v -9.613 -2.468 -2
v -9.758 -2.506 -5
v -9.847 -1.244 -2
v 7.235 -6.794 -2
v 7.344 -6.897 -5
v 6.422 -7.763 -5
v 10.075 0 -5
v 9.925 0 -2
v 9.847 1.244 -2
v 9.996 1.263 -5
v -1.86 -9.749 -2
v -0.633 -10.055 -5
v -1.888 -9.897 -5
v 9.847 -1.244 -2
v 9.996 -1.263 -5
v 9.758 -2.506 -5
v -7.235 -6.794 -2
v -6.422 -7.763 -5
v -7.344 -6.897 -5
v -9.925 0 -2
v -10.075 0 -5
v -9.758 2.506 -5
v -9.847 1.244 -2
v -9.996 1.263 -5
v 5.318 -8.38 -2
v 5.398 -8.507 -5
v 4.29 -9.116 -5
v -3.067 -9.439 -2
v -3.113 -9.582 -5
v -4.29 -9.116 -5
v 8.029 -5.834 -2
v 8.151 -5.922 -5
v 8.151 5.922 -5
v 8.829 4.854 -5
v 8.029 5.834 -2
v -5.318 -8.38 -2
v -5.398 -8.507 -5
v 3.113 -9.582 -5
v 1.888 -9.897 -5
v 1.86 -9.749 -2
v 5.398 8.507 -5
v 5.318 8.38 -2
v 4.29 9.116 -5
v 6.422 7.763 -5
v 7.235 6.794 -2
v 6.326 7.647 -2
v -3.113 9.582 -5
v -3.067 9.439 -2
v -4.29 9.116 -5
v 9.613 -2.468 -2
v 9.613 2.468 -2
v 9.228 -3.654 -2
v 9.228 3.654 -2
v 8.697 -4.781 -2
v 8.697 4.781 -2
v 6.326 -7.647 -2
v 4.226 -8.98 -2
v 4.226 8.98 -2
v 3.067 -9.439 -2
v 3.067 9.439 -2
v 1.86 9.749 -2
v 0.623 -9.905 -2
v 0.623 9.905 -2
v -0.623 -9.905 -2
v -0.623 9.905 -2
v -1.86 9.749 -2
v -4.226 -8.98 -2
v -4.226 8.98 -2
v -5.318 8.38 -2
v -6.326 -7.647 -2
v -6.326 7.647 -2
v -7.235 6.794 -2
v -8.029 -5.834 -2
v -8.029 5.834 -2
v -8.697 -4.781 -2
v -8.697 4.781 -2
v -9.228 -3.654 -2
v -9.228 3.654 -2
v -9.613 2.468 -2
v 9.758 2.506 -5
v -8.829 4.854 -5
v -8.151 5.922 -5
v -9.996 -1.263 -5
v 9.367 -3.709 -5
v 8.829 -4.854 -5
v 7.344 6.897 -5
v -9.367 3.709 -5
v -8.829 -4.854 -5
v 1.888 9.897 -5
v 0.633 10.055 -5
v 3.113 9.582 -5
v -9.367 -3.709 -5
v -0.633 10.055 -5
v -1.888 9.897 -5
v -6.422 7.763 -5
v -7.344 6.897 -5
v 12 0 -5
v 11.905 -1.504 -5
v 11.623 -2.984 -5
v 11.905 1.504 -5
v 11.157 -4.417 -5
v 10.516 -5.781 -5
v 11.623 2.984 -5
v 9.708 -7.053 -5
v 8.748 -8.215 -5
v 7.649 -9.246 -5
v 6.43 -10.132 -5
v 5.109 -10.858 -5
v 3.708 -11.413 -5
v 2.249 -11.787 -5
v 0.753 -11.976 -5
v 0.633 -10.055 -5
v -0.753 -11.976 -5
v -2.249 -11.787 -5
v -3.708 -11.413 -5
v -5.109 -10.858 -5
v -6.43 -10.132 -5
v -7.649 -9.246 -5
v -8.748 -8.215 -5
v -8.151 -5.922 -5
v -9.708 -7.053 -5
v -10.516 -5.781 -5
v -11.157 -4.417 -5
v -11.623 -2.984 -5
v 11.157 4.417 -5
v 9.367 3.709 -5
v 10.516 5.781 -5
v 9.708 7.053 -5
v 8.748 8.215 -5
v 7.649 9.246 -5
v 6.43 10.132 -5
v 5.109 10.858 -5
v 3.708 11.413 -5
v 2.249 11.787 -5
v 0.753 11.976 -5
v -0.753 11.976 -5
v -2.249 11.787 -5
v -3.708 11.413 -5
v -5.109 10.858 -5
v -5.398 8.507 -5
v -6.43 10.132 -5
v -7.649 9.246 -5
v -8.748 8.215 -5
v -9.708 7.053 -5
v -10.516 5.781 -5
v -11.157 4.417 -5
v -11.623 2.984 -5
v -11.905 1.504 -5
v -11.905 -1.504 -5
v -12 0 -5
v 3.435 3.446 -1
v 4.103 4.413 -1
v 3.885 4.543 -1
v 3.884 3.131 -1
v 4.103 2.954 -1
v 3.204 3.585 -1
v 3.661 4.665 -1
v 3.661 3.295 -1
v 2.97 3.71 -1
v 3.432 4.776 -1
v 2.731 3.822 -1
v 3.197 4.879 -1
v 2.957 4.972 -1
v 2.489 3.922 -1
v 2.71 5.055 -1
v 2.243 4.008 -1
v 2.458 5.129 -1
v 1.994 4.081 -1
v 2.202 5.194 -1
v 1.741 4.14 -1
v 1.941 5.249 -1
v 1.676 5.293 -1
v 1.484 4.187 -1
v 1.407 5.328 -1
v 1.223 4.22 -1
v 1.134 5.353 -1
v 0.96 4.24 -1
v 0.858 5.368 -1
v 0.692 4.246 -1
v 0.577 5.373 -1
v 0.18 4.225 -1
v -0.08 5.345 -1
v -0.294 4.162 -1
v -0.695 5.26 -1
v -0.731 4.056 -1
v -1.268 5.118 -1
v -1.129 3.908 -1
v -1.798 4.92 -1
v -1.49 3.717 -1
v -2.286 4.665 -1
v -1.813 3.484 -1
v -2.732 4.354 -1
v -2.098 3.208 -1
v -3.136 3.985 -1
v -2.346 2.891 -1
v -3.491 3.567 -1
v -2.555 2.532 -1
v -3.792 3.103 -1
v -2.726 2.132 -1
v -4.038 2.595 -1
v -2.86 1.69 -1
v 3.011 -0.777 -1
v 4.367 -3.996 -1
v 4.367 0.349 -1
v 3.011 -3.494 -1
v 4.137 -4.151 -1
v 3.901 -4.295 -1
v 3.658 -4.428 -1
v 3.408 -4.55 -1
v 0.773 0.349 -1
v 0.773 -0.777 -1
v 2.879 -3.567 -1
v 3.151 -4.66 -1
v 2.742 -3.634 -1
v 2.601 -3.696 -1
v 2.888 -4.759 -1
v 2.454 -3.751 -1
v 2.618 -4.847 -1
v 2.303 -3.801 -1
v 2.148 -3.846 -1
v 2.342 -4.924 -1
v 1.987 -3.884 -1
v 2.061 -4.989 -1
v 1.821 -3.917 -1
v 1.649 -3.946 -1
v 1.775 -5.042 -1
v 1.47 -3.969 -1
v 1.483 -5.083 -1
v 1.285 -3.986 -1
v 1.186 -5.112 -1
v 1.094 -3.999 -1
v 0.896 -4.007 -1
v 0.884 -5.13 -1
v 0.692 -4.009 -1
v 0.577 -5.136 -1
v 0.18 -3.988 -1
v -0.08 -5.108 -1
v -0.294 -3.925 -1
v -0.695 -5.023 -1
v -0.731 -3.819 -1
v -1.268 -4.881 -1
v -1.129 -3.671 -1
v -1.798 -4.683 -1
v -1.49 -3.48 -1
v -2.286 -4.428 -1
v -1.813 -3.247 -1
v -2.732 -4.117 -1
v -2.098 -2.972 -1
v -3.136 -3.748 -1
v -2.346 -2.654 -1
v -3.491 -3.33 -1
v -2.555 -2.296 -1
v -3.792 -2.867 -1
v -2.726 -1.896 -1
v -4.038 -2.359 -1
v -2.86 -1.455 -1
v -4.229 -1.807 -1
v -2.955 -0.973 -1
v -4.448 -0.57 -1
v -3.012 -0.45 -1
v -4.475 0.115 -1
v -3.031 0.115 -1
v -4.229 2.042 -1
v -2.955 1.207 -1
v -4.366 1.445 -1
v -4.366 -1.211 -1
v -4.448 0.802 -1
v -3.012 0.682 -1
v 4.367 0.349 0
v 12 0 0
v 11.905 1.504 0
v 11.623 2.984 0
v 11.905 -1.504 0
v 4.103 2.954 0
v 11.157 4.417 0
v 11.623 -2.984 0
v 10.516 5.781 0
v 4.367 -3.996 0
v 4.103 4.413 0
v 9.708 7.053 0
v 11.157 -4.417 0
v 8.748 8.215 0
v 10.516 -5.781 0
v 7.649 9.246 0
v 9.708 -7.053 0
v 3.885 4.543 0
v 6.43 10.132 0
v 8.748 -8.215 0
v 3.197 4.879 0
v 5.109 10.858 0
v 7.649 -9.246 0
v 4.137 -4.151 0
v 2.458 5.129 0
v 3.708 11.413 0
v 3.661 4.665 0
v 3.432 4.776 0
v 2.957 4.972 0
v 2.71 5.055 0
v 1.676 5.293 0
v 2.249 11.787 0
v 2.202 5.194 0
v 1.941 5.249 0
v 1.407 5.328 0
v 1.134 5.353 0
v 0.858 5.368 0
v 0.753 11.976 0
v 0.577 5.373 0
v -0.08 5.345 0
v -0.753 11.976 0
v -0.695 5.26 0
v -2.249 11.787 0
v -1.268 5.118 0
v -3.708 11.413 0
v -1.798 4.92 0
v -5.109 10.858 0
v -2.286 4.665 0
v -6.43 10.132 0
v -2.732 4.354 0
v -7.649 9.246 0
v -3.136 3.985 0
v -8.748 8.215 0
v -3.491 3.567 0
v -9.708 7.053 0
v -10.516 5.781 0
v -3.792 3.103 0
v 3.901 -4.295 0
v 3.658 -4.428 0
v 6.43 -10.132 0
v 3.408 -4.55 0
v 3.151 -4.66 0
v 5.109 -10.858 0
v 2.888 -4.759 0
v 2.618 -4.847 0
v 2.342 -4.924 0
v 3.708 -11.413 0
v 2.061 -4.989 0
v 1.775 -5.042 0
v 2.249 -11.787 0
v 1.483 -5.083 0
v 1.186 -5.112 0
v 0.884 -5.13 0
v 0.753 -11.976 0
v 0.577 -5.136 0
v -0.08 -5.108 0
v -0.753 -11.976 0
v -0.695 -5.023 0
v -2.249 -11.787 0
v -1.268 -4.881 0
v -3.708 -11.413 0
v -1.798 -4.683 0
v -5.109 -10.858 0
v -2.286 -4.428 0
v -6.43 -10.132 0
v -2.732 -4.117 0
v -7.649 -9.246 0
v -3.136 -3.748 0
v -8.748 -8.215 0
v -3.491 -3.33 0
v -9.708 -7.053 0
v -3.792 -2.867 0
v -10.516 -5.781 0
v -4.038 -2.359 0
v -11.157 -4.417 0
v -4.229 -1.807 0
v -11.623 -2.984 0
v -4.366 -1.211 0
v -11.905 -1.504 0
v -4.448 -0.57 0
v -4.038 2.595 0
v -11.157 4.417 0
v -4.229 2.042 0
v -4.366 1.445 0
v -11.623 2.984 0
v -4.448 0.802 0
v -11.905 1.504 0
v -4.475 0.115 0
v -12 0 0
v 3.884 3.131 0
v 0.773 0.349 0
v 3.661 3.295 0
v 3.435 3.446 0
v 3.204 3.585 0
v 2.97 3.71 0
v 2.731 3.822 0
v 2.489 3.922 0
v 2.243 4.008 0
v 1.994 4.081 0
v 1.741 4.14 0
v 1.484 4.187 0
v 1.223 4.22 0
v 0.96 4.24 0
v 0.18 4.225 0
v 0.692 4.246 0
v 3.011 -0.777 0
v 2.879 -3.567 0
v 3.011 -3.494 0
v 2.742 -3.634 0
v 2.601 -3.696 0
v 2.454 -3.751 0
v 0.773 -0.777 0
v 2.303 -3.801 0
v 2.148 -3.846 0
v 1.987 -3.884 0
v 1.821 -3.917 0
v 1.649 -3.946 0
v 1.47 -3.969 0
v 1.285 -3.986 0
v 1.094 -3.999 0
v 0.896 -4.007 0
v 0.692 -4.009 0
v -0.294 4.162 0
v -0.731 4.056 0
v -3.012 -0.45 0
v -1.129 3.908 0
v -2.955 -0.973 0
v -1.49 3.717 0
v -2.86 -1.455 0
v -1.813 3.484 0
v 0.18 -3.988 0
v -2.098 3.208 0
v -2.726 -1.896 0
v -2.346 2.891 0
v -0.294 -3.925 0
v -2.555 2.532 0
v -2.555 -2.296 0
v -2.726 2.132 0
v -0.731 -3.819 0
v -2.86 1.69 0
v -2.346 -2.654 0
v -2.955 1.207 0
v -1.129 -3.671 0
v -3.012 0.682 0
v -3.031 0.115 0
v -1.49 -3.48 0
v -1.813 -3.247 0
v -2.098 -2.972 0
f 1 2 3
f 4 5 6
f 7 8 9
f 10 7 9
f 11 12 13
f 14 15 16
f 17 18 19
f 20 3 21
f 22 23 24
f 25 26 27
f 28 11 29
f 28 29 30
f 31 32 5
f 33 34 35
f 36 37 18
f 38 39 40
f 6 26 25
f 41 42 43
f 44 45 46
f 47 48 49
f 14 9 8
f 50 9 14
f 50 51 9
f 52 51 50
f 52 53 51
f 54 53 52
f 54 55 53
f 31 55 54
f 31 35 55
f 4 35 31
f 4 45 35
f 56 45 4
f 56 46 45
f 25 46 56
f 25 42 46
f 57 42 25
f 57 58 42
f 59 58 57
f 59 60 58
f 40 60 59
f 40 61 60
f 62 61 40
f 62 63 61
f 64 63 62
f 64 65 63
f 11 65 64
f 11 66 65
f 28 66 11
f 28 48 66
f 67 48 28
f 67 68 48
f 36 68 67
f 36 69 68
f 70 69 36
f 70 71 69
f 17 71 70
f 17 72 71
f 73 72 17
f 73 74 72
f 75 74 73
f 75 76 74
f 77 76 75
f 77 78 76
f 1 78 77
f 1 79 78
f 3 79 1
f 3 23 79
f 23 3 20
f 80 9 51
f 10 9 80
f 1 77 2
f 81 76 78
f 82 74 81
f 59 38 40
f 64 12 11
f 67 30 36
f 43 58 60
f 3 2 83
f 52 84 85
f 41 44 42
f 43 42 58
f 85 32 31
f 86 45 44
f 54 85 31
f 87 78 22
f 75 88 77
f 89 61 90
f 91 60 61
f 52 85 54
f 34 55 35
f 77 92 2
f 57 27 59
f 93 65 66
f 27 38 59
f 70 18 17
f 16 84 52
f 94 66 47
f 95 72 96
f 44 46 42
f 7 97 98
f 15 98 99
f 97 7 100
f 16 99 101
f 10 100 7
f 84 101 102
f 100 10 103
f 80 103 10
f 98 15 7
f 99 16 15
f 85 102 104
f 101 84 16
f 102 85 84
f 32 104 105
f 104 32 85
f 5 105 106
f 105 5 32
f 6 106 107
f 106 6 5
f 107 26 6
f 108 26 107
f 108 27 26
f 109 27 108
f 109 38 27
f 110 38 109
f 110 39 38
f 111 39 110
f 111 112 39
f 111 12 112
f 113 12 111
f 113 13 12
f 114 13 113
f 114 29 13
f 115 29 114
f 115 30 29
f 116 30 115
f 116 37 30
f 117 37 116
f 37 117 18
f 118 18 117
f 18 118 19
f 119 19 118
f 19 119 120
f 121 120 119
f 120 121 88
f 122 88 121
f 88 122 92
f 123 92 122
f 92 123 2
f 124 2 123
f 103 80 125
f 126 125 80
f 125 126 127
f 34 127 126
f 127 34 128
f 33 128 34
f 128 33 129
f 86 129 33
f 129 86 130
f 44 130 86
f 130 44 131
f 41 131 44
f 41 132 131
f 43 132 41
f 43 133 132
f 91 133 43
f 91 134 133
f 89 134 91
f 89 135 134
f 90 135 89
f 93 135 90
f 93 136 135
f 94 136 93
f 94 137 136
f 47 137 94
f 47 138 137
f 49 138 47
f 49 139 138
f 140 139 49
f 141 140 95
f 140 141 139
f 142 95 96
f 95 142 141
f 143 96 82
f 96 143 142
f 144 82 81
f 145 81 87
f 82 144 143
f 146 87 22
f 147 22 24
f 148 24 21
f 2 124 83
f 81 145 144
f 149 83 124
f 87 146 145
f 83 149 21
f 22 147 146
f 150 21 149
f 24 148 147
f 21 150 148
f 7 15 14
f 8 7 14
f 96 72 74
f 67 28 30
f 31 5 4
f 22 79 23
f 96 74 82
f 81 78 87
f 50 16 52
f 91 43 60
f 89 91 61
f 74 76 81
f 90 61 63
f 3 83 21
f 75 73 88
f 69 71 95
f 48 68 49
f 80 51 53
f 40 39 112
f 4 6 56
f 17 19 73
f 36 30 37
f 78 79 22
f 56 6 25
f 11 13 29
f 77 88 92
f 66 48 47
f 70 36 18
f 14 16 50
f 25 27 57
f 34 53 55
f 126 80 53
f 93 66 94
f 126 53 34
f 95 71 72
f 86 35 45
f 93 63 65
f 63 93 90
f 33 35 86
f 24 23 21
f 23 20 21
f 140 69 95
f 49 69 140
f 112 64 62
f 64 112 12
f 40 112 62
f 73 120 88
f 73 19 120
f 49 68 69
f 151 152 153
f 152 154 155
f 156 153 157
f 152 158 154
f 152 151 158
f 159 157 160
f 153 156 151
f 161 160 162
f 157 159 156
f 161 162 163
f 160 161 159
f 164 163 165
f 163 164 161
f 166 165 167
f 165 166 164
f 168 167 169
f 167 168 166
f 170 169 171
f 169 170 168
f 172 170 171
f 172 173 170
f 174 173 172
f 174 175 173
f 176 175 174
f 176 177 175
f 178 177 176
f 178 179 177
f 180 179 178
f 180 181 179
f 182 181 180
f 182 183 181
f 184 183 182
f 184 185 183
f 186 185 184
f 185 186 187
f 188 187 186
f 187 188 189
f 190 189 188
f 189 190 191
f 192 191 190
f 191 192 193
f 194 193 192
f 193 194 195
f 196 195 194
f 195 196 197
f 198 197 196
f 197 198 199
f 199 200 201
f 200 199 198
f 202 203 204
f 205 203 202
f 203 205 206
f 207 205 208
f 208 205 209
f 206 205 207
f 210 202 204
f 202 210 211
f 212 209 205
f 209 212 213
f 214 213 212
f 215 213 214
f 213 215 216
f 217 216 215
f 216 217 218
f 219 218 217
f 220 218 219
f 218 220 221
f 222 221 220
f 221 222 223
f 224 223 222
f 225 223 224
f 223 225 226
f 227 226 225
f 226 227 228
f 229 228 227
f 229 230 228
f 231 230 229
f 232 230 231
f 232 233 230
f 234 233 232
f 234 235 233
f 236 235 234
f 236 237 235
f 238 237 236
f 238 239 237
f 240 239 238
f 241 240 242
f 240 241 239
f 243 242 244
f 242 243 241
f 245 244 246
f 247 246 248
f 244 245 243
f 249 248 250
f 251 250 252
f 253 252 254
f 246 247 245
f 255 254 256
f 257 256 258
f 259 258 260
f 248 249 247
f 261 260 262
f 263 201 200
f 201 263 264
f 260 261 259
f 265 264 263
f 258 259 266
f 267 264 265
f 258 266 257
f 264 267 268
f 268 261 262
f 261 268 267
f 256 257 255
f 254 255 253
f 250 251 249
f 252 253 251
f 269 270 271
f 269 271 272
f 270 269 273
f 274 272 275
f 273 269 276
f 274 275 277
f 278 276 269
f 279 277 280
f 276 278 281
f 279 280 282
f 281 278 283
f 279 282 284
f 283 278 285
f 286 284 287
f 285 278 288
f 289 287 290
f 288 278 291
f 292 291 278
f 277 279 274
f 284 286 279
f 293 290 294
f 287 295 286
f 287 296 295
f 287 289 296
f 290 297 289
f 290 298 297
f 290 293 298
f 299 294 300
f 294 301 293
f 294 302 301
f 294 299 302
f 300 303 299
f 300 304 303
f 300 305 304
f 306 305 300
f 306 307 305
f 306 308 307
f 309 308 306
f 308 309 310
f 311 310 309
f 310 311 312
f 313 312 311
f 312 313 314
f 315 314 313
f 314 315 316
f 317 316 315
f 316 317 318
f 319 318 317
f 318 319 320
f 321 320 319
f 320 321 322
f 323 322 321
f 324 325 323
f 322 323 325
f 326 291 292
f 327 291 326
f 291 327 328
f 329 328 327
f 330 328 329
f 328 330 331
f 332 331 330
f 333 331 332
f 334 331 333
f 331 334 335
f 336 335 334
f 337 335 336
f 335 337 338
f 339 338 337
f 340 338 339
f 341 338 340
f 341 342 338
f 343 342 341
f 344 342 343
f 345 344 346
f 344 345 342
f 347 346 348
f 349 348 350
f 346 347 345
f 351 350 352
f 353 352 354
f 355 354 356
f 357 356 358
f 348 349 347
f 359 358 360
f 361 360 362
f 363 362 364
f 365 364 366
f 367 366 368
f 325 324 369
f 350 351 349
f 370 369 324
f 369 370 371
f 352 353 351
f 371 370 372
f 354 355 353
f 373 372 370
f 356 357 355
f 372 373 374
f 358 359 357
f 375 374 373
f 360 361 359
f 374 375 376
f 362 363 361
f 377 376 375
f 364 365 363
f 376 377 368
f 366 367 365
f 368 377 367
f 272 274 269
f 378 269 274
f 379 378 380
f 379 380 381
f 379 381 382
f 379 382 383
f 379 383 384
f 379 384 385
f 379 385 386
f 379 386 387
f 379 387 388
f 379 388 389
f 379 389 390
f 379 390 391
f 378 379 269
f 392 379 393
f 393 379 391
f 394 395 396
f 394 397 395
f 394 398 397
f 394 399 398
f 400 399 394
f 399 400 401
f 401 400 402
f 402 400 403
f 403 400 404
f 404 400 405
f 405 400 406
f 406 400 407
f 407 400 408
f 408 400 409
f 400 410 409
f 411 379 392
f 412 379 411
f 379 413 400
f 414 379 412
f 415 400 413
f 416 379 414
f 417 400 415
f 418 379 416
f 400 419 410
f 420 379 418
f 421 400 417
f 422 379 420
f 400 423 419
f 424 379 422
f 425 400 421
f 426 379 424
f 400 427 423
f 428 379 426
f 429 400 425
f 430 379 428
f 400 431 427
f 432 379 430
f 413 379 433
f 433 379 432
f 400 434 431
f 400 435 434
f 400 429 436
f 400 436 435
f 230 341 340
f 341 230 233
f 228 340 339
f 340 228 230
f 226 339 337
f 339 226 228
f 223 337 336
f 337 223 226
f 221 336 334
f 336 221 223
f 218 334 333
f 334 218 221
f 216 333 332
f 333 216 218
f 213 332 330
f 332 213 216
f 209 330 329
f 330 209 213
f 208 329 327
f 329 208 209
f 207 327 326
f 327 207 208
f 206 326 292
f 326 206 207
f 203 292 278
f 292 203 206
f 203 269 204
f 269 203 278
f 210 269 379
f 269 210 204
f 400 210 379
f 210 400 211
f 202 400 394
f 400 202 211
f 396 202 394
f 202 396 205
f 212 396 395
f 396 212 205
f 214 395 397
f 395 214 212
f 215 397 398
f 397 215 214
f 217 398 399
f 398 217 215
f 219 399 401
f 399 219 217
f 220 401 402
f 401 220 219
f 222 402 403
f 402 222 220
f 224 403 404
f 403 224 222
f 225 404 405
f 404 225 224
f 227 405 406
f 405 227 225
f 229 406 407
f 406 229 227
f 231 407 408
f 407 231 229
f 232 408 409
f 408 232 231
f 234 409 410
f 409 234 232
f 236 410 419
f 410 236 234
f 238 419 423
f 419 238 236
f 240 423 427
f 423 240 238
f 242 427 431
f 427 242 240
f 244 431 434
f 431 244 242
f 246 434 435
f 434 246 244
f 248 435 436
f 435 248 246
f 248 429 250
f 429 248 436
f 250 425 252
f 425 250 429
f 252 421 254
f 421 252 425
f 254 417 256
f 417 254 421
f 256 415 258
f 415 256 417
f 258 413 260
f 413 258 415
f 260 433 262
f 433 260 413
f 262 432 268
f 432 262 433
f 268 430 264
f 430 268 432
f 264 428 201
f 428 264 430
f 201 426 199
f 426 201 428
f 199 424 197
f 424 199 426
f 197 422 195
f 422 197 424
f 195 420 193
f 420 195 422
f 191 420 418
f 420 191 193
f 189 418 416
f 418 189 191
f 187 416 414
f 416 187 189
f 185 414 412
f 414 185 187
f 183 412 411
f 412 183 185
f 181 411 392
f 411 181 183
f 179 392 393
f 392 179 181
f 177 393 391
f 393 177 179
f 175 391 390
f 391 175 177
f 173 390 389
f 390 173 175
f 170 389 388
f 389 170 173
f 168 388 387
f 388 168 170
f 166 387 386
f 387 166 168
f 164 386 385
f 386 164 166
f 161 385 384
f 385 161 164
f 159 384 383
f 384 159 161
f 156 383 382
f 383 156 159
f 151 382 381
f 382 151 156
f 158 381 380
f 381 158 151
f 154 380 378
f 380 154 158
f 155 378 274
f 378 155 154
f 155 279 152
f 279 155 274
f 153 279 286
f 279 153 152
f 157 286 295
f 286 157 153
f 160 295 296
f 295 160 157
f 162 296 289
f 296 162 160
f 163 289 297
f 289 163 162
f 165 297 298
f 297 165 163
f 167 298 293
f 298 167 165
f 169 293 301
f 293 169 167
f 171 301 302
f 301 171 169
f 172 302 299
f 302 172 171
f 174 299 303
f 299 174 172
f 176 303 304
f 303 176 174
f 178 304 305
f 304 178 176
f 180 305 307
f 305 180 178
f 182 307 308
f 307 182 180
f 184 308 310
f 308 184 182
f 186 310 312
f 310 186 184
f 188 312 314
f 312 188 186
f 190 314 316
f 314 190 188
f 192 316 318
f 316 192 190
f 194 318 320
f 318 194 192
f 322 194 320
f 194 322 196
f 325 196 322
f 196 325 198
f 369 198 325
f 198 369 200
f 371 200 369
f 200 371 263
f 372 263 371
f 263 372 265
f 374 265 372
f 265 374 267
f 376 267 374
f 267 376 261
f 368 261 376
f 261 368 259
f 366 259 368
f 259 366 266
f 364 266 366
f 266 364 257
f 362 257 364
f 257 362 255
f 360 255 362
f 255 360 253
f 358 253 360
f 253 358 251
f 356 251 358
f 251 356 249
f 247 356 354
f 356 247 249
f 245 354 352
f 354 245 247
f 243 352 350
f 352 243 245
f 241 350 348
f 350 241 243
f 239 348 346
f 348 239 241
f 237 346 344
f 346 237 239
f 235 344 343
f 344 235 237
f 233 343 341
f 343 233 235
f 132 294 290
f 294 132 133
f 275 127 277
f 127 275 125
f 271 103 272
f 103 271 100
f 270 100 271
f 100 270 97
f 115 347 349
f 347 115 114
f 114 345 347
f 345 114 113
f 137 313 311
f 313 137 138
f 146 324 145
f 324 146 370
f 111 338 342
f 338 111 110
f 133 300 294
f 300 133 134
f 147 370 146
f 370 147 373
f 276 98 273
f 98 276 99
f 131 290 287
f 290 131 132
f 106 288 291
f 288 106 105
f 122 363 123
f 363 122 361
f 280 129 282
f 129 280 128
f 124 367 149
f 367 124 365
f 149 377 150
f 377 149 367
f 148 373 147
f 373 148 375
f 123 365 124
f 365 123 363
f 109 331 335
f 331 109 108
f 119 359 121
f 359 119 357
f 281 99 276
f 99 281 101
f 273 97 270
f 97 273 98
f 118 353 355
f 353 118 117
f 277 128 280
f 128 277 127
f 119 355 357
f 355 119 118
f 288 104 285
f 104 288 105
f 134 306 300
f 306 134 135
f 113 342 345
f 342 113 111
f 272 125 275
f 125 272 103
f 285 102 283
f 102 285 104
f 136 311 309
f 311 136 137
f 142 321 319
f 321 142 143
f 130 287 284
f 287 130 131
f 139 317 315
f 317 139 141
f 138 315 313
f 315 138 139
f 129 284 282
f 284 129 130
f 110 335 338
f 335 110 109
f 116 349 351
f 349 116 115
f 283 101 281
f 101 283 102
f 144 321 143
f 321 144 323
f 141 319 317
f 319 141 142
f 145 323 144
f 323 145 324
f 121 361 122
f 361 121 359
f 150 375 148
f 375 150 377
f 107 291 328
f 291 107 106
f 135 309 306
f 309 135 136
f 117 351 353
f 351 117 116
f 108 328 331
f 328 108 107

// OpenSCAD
$fn = 50;

difference() {
	union() {
		translate(v = [0, 0, -5.0]) {
			cylinder(h = 5, r = 12.0);
		}
	}
	union() {
		#translate(v = [0, 0, -5.0]) {
			cylinder(h = 3, r1 = 10.075, r2 = 9.925);
		}
		translate(v = [0, 0, -1]) {
			linear_extrude(height = 1) {
				text(font = "Impact", halign = "center", size = 10, text = "G", valign = "center");
			}
		}
	}
}
